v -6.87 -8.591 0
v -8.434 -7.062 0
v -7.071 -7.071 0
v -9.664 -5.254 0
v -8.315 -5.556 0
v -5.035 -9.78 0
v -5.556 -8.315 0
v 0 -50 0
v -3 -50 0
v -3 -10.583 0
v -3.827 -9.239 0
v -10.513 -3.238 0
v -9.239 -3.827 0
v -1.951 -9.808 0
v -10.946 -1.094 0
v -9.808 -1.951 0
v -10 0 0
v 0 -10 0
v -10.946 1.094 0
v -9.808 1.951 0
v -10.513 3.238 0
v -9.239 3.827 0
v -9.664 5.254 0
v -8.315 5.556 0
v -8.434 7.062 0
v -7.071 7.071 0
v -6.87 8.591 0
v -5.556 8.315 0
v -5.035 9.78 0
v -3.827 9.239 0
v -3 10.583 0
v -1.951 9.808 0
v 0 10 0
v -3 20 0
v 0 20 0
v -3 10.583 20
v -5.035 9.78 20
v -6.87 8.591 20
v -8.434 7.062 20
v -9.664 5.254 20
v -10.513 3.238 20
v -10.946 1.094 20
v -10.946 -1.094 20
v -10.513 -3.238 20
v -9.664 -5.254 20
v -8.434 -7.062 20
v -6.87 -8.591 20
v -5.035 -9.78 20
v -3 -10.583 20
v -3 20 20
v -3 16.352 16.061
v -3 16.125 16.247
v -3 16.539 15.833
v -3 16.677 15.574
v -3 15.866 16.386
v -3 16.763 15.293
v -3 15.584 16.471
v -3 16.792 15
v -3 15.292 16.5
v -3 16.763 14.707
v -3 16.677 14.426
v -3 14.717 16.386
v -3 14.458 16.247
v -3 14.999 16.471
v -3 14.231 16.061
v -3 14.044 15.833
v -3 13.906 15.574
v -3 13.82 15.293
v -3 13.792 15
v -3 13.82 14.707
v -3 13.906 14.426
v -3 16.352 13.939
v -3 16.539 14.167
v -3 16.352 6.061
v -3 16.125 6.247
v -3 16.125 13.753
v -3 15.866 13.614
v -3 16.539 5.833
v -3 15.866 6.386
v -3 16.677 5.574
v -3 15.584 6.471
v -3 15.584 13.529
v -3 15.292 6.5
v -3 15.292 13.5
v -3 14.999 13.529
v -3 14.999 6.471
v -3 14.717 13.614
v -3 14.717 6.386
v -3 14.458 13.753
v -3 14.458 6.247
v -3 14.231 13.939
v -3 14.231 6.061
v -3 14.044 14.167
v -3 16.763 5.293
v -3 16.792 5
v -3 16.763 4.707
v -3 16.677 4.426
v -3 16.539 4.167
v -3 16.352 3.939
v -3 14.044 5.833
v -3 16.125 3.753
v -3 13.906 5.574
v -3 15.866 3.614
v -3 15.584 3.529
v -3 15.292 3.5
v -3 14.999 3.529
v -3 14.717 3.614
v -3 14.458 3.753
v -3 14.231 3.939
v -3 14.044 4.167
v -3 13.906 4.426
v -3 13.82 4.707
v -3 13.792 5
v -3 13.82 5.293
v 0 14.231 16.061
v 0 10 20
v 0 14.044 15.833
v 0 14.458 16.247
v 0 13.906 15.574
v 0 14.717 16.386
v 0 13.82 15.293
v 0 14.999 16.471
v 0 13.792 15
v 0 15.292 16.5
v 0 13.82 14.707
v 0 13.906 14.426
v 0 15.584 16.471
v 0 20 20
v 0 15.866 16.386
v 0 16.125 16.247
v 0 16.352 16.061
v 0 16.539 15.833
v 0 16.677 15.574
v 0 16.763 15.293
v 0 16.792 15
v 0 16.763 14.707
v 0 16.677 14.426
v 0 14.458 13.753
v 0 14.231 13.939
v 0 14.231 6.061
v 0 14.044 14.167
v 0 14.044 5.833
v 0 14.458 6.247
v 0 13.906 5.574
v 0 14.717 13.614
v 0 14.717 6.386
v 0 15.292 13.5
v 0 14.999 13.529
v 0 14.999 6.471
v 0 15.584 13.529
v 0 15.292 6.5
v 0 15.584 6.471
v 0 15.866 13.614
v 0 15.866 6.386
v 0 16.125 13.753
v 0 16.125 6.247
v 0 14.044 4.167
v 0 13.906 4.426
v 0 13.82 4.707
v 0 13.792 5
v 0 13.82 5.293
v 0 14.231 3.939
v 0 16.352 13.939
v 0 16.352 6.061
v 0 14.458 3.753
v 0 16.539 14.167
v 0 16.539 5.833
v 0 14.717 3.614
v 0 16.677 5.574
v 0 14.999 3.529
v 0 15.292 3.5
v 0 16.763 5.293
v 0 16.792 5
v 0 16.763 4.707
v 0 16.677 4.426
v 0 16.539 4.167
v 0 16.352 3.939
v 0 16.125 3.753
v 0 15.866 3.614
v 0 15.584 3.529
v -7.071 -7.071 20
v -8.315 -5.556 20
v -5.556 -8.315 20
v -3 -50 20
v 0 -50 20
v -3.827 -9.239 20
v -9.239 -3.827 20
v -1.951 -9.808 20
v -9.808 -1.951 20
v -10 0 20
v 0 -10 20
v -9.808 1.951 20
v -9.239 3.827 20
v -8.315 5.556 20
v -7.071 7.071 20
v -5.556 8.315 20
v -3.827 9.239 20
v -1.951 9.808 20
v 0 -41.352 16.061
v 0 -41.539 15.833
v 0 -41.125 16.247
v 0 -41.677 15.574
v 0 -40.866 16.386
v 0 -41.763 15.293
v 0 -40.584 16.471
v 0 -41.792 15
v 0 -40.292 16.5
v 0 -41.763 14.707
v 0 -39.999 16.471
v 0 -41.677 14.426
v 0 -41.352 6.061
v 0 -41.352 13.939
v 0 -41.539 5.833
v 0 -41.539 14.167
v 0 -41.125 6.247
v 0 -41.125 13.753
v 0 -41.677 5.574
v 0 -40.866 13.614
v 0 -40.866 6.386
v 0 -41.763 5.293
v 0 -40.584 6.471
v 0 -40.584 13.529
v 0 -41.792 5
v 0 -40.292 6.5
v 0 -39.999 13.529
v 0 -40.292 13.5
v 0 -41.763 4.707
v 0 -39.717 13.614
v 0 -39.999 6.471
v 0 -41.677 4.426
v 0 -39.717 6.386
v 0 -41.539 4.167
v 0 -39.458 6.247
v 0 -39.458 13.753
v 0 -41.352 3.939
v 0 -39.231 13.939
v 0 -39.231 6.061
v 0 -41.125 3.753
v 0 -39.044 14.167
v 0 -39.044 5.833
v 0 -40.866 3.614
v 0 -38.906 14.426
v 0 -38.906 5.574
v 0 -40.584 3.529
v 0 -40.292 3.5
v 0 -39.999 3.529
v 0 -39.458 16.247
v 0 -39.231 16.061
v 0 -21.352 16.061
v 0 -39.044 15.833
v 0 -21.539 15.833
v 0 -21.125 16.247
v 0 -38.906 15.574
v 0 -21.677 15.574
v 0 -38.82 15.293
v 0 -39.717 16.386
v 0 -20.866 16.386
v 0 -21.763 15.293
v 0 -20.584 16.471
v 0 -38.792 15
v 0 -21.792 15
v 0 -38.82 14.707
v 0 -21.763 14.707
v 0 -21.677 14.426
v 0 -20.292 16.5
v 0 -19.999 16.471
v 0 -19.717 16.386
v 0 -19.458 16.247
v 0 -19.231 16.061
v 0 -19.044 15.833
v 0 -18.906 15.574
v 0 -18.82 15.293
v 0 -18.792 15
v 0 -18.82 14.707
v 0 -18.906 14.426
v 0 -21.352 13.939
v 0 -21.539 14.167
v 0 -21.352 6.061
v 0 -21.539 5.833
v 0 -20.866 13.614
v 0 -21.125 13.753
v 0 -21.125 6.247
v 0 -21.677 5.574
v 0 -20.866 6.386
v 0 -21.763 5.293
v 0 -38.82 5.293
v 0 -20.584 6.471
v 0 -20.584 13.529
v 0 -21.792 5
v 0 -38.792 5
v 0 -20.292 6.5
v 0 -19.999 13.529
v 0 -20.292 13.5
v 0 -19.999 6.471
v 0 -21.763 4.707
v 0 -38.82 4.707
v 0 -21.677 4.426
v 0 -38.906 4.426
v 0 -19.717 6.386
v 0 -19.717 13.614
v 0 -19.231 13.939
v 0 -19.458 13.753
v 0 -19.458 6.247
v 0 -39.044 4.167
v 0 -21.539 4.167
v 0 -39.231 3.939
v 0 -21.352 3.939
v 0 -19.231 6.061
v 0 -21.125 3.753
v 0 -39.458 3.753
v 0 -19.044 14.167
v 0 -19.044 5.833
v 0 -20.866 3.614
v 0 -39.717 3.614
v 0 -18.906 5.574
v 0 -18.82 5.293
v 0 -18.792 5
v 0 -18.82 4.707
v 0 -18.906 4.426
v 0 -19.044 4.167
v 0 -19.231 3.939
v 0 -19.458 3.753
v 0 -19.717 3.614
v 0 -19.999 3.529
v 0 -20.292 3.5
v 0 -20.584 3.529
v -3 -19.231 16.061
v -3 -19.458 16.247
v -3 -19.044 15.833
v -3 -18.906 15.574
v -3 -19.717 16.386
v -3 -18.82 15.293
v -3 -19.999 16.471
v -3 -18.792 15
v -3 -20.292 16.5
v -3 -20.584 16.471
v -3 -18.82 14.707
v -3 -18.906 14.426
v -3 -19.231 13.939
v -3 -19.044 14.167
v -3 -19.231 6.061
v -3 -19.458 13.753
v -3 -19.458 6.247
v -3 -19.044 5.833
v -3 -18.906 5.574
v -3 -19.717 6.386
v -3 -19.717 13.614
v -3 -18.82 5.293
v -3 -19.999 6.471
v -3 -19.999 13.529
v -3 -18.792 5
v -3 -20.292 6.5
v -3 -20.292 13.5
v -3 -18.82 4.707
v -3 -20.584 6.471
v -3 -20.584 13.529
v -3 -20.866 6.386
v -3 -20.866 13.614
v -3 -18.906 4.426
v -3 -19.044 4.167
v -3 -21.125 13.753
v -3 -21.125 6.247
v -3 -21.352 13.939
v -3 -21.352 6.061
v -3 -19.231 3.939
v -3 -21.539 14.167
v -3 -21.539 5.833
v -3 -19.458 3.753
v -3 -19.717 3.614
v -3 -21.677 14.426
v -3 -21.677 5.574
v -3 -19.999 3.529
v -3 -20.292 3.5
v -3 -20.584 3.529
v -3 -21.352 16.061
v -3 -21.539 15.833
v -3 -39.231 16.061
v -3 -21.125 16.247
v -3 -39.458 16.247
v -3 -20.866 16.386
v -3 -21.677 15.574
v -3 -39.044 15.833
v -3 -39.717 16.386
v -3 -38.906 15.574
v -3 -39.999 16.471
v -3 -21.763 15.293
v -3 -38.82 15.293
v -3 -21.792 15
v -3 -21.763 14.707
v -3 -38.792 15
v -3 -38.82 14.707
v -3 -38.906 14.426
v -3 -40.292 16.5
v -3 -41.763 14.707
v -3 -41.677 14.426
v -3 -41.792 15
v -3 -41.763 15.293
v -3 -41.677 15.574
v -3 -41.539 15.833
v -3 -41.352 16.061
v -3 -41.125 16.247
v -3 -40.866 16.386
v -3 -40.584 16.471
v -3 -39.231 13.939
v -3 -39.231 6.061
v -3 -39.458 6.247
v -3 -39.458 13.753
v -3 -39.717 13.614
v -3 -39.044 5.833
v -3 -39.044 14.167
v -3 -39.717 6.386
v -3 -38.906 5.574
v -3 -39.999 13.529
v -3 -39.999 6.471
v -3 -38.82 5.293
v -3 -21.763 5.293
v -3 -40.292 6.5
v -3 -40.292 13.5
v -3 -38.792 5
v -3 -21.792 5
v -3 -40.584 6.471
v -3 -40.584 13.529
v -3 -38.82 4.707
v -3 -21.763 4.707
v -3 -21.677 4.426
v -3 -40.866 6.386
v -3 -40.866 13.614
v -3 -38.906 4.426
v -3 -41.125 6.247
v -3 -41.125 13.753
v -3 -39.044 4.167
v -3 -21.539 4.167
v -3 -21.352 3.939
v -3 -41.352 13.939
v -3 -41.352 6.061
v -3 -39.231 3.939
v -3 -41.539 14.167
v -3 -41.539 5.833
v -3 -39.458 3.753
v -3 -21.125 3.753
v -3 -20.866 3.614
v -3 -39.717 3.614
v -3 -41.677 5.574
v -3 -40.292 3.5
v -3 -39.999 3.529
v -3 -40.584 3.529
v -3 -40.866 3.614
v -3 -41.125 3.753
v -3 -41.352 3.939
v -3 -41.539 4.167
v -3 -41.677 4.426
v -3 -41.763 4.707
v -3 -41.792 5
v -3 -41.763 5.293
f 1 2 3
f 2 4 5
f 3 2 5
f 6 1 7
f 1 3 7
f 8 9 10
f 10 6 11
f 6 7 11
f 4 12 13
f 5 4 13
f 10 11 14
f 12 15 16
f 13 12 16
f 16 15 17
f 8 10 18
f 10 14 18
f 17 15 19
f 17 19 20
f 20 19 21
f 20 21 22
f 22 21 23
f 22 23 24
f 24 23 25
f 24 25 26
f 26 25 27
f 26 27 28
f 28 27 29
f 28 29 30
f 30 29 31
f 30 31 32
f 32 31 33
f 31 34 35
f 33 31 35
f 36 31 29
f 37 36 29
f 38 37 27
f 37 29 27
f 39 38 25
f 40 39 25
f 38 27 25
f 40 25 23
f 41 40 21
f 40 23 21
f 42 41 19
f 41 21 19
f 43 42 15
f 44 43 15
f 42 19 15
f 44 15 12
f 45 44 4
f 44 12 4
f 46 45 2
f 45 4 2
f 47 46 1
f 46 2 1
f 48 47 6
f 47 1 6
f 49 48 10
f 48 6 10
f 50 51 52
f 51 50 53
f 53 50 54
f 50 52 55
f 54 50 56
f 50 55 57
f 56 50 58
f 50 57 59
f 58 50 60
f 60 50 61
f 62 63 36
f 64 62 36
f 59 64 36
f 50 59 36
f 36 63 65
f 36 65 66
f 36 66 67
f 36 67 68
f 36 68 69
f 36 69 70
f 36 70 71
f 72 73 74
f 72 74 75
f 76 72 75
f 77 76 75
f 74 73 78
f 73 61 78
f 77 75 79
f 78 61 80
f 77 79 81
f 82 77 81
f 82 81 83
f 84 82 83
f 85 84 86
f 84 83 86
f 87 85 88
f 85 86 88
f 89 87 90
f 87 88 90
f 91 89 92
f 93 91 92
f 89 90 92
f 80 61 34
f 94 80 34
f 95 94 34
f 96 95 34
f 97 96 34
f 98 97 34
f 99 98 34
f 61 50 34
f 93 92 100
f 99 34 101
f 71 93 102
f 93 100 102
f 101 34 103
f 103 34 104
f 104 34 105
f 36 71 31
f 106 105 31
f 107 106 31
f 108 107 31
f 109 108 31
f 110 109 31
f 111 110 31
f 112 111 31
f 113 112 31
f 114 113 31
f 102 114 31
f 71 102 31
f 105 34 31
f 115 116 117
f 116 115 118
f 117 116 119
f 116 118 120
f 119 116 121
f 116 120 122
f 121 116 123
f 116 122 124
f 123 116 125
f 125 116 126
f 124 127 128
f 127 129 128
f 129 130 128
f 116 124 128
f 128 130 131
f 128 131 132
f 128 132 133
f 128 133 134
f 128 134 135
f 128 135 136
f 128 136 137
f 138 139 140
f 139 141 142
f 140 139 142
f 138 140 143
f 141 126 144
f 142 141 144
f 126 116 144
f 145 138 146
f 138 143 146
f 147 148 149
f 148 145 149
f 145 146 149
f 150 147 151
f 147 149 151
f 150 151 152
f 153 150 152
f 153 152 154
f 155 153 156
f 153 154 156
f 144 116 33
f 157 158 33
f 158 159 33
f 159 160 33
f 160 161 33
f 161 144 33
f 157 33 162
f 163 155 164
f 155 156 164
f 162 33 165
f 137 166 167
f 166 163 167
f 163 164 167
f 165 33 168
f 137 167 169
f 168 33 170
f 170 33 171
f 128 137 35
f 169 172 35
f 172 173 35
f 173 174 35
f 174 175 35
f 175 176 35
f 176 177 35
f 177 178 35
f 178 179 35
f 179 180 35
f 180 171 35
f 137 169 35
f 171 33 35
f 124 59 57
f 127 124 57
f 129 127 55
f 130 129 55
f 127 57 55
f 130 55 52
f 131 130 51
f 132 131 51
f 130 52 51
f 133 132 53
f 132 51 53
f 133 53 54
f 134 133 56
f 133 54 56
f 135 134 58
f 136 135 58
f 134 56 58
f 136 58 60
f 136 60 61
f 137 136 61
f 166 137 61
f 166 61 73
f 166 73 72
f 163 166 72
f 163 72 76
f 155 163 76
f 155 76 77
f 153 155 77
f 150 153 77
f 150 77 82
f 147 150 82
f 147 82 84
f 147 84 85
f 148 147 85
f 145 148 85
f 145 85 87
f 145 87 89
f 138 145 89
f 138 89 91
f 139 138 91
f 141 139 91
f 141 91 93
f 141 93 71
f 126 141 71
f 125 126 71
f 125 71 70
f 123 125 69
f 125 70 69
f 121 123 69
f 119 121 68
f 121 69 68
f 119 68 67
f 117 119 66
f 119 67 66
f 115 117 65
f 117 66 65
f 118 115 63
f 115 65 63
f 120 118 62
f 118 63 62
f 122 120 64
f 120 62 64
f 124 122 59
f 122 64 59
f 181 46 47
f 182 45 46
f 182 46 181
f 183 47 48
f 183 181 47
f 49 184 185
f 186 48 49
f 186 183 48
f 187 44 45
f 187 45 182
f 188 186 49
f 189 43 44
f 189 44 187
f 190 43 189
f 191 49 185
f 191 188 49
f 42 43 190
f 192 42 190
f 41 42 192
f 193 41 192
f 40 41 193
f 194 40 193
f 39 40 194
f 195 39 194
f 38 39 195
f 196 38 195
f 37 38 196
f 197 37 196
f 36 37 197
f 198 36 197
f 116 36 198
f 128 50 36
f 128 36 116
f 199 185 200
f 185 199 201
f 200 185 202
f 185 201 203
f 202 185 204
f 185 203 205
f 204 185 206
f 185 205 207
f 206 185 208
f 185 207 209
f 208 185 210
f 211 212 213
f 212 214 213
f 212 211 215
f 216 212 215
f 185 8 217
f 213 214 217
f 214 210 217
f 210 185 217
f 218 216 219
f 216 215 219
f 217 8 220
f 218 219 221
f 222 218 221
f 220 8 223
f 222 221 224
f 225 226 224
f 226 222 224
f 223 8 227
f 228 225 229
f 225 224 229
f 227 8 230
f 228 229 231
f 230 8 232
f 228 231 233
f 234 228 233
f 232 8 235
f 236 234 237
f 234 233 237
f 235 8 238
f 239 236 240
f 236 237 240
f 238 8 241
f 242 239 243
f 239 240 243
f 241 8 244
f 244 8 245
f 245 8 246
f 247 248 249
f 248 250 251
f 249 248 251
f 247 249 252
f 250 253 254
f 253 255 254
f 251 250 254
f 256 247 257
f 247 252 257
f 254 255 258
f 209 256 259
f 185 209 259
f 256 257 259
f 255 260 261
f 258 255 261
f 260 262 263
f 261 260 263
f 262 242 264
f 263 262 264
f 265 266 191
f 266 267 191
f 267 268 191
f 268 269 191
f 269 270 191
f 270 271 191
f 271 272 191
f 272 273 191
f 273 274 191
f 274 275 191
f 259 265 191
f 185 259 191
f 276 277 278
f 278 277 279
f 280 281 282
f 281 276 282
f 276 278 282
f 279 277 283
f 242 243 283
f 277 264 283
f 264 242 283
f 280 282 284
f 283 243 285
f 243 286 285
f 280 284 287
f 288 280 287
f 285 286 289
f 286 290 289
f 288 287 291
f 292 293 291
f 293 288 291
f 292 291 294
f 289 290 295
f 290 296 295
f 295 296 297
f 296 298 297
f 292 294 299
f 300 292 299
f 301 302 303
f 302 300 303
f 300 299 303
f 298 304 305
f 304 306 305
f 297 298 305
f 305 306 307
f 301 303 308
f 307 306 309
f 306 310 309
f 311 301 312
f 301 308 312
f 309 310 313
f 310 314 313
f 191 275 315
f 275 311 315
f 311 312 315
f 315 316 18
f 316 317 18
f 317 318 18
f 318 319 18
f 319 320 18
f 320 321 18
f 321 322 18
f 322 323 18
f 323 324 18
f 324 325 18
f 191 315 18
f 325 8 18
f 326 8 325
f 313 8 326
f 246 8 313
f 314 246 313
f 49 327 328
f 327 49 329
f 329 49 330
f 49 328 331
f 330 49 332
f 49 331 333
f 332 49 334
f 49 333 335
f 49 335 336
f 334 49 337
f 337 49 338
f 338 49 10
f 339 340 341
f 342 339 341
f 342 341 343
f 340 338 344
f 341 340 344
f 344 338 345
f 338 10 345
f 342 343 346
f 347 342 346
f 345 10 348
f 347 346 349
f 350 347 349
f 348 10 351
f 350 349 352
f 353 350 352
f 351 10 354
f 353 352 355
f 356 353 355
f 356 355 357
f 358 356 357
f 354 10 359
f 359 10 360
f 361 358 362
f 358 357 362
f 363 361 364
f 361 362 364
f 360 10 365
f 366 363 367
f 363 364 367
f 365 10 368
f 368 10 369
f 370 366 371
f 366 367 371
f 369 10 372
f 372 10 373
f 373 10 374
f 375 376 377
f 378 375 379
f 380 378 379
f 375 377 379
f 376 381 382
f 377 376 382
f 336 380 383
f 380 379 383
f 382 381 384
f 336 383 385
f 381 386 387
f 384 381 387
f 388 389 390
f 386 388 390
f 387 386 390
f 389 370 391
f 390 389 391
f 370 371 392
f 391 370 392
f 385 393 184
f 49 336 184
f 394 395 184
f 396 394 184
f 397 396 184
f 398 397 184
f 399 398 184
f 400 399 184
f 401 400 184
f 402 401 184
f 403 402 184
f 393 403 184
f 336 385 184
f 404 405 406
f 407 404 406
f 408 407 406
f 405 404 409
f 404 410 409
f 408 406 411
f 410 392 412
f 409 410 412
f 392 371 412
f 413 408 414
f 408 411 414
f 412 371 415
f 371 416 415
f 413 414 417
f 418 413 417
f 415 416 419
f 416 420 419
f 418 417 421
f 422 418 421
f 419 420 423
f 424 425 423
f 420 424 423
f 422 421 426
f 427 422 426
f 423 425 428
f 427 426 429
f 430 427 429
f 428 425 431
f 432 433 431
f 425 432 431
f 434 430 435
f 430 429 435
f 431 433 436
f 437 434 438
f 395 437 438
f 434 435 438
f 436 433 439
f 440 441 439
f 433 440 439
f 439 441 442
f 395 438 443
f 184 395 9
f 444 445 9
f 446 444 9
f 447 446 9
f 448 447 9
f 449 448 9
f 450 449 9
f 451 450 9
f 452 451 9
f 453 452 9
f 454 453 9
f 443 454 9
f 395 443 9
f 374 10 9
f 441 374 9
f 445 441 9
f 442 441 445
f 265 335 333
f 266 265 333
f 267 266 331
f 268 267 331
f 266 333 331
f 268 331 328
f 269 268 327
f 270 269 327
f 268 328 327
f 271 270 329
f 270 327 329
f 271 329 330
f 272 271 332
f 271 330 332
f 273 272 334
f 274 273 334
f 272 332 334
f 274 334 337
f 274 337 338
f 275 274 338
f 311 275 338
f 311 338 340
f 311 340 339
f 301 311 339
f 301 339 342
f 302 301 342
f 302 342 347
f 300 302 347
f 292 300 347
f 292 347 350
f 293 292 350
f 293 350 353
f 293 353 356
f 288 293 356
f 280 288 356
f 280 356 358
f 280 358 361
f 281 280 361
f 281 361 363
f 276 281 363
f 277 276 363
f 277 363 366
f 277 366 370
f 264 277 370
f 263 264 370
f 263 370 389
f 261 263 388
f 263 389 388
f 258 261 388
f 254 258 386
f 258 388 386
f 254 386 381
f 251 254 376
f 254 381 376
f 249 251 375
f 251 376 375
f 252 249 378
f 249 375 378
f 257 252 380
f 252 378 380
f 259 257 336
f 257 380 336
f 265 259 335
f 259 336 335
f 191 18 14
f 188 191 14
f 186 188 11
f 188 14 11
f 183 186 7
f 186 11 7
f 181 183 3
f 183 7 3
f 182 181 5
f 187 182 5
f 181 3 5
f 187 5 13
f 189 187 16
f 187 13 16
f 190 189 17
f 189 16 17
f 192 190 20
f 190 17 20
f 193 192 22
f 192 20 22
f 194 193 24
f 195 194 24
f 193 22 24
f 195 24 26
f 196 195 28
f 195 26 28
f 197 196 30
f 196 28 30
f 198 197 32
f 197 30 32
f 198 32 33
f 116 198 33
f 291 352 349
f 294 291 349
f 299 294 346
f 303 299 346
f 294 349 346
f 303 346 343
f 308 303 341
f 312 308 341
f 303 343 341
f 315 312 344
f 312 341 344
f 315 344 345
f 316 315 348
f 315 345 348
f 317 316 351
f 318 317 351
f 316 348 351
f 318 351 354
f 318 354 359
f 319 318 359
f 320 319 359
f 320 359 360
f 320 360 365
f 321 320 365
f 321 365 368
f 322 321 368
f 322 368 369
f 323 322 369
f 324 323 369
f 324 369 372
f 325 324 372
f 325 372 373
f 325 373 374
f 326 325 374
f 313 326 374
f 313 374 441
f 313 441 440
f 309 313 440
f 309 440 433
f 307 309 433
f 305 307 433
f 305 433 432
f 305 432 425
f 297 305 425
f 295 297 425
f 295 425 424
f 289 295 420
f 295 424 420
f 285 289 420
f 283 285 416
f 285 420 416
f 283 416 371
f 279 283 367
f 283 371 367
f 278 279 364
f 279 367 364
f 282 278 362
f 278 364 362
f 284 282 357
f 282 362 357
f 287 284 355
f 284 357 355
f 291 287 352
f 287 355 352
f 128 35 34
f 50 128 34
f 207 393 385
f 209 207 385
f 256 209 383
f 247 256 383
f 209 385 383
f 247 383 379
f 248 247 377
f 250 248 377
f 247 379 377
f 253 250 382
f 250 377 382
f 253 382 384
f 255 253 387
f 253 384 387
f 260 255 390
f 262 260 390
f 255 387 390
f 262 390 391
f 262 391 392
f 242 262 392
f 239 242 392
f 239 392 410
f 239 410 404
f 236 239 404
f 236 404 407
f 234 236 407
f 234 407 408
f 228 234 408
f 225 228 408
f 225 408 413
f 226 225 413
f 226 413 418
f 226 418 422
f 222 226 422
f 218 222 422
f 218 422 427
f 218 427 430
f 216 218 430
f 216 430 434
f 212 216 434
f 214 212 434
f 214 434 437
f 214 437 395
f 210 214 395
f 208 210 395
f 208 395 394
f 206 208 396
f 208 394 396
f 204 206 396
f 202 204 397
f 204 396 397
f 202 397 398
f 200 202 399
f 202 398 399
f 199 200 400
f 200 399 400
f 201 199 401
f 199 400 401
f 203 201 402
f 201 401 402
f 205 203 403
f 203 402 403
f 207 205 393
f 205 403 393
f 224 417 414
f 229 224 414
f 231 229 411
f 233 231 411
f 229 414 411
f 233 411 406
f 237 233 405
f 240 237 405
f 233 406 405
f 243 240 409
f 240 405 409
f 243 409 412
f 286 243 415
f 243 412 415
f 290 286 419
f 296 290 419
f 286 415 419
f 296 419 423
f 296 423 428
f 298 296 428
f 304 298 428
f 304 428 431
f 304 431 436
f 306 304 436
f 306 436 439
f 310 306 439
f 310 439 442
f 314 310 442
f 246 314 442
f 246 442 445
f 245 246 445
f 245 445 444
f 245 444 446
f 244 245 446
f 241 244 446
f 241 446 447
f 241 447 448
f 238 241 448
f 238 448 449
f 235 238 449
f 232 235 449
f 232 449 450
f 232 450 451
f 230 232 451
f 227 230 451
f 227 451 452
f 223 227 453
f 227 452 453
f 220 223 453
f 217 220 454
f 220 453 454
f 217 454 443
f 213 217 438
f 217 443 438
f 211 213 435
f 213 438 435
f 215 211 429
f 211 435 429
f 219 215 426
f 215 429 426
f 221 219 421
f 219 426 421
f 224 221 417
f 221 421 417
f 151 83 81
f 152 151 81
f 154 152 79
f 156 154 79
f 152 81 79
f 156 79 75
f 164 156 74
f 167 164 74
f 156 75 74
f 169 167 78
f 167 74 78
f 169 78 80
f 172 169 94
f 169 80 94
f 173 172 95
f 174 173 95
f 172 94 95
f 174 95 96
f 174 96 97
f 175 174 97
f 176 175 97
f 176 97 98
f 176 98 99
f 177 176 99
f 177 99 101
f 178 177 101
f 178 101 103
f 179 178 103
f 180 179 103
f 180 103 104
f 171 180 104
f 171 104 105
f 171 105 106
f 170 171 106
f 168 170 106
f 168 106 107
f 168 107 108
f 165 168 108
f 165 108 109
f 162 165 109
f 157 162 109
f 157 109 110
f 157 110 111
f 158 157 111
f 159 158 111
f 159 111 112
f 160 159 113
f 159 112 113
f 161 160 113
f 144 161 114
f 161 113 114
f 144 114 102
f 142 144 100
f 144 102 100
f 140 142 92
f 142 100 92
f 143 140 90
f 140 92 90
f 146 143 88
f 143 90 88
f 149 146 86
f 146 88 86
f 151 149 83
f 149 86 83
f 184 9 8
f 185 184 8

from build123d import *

# Parameters (mm, degrees)
EXTRUDE_1_DEPTH     = 20
SKETCH_2_R          = 1.5
CUT_EXTRUDE_1_DEPTH = 20


with BuildPart() as part:
    # 草图1 → 凸台-拉伸1 (new body)
    with BuildSketch(Plane.XY):
        with BuildLine():
            Line((-3, 20), (-3, 10.583005244))
            ThreePointArc((-3, 10.583005244), (-11, 0), (-3, -10.583005244))
            Line((-3, -10.583005244), (-3, -50))
            Line((-3, -50), (0, -50))
            Line((0, -50), (0, -10))
            ThreePointArc((0, -10), (-10, 0), (0, 10))
            Line((0, 10), (0, 20))
            Line((0, 20), (-3, 20))
        make_face()
    extrude(amount=EXTRUDE_1_DEPTH)

    # 草图2 → 切除-拉伸1 (cut)
    with BuildSketch(Plane.ZY.offset(3)):
        with Locations((5, 15.291502622)):
            Circle(SKETCH_2_R)
        with Locations((15, 15.291502622)):
            Circle(SKETCH_2_R)
        with Locations((5, -20.291502622)):
            Circle(SKETCH_2_R)
        with Locations((15, -20.291502622)):
            Circle(SKETCH_2_R)
        with Locations((15, -40.291502622)):
            Circle(SKETCH_2_R)
        with Locations((5, -40.291502622)):
            Circle(SKETCH_2_R)
    extrude(amount=-CUT_EXTRUDE_1_DEPTH, mode=Mode.SUBTRACT)


solid = part.part
